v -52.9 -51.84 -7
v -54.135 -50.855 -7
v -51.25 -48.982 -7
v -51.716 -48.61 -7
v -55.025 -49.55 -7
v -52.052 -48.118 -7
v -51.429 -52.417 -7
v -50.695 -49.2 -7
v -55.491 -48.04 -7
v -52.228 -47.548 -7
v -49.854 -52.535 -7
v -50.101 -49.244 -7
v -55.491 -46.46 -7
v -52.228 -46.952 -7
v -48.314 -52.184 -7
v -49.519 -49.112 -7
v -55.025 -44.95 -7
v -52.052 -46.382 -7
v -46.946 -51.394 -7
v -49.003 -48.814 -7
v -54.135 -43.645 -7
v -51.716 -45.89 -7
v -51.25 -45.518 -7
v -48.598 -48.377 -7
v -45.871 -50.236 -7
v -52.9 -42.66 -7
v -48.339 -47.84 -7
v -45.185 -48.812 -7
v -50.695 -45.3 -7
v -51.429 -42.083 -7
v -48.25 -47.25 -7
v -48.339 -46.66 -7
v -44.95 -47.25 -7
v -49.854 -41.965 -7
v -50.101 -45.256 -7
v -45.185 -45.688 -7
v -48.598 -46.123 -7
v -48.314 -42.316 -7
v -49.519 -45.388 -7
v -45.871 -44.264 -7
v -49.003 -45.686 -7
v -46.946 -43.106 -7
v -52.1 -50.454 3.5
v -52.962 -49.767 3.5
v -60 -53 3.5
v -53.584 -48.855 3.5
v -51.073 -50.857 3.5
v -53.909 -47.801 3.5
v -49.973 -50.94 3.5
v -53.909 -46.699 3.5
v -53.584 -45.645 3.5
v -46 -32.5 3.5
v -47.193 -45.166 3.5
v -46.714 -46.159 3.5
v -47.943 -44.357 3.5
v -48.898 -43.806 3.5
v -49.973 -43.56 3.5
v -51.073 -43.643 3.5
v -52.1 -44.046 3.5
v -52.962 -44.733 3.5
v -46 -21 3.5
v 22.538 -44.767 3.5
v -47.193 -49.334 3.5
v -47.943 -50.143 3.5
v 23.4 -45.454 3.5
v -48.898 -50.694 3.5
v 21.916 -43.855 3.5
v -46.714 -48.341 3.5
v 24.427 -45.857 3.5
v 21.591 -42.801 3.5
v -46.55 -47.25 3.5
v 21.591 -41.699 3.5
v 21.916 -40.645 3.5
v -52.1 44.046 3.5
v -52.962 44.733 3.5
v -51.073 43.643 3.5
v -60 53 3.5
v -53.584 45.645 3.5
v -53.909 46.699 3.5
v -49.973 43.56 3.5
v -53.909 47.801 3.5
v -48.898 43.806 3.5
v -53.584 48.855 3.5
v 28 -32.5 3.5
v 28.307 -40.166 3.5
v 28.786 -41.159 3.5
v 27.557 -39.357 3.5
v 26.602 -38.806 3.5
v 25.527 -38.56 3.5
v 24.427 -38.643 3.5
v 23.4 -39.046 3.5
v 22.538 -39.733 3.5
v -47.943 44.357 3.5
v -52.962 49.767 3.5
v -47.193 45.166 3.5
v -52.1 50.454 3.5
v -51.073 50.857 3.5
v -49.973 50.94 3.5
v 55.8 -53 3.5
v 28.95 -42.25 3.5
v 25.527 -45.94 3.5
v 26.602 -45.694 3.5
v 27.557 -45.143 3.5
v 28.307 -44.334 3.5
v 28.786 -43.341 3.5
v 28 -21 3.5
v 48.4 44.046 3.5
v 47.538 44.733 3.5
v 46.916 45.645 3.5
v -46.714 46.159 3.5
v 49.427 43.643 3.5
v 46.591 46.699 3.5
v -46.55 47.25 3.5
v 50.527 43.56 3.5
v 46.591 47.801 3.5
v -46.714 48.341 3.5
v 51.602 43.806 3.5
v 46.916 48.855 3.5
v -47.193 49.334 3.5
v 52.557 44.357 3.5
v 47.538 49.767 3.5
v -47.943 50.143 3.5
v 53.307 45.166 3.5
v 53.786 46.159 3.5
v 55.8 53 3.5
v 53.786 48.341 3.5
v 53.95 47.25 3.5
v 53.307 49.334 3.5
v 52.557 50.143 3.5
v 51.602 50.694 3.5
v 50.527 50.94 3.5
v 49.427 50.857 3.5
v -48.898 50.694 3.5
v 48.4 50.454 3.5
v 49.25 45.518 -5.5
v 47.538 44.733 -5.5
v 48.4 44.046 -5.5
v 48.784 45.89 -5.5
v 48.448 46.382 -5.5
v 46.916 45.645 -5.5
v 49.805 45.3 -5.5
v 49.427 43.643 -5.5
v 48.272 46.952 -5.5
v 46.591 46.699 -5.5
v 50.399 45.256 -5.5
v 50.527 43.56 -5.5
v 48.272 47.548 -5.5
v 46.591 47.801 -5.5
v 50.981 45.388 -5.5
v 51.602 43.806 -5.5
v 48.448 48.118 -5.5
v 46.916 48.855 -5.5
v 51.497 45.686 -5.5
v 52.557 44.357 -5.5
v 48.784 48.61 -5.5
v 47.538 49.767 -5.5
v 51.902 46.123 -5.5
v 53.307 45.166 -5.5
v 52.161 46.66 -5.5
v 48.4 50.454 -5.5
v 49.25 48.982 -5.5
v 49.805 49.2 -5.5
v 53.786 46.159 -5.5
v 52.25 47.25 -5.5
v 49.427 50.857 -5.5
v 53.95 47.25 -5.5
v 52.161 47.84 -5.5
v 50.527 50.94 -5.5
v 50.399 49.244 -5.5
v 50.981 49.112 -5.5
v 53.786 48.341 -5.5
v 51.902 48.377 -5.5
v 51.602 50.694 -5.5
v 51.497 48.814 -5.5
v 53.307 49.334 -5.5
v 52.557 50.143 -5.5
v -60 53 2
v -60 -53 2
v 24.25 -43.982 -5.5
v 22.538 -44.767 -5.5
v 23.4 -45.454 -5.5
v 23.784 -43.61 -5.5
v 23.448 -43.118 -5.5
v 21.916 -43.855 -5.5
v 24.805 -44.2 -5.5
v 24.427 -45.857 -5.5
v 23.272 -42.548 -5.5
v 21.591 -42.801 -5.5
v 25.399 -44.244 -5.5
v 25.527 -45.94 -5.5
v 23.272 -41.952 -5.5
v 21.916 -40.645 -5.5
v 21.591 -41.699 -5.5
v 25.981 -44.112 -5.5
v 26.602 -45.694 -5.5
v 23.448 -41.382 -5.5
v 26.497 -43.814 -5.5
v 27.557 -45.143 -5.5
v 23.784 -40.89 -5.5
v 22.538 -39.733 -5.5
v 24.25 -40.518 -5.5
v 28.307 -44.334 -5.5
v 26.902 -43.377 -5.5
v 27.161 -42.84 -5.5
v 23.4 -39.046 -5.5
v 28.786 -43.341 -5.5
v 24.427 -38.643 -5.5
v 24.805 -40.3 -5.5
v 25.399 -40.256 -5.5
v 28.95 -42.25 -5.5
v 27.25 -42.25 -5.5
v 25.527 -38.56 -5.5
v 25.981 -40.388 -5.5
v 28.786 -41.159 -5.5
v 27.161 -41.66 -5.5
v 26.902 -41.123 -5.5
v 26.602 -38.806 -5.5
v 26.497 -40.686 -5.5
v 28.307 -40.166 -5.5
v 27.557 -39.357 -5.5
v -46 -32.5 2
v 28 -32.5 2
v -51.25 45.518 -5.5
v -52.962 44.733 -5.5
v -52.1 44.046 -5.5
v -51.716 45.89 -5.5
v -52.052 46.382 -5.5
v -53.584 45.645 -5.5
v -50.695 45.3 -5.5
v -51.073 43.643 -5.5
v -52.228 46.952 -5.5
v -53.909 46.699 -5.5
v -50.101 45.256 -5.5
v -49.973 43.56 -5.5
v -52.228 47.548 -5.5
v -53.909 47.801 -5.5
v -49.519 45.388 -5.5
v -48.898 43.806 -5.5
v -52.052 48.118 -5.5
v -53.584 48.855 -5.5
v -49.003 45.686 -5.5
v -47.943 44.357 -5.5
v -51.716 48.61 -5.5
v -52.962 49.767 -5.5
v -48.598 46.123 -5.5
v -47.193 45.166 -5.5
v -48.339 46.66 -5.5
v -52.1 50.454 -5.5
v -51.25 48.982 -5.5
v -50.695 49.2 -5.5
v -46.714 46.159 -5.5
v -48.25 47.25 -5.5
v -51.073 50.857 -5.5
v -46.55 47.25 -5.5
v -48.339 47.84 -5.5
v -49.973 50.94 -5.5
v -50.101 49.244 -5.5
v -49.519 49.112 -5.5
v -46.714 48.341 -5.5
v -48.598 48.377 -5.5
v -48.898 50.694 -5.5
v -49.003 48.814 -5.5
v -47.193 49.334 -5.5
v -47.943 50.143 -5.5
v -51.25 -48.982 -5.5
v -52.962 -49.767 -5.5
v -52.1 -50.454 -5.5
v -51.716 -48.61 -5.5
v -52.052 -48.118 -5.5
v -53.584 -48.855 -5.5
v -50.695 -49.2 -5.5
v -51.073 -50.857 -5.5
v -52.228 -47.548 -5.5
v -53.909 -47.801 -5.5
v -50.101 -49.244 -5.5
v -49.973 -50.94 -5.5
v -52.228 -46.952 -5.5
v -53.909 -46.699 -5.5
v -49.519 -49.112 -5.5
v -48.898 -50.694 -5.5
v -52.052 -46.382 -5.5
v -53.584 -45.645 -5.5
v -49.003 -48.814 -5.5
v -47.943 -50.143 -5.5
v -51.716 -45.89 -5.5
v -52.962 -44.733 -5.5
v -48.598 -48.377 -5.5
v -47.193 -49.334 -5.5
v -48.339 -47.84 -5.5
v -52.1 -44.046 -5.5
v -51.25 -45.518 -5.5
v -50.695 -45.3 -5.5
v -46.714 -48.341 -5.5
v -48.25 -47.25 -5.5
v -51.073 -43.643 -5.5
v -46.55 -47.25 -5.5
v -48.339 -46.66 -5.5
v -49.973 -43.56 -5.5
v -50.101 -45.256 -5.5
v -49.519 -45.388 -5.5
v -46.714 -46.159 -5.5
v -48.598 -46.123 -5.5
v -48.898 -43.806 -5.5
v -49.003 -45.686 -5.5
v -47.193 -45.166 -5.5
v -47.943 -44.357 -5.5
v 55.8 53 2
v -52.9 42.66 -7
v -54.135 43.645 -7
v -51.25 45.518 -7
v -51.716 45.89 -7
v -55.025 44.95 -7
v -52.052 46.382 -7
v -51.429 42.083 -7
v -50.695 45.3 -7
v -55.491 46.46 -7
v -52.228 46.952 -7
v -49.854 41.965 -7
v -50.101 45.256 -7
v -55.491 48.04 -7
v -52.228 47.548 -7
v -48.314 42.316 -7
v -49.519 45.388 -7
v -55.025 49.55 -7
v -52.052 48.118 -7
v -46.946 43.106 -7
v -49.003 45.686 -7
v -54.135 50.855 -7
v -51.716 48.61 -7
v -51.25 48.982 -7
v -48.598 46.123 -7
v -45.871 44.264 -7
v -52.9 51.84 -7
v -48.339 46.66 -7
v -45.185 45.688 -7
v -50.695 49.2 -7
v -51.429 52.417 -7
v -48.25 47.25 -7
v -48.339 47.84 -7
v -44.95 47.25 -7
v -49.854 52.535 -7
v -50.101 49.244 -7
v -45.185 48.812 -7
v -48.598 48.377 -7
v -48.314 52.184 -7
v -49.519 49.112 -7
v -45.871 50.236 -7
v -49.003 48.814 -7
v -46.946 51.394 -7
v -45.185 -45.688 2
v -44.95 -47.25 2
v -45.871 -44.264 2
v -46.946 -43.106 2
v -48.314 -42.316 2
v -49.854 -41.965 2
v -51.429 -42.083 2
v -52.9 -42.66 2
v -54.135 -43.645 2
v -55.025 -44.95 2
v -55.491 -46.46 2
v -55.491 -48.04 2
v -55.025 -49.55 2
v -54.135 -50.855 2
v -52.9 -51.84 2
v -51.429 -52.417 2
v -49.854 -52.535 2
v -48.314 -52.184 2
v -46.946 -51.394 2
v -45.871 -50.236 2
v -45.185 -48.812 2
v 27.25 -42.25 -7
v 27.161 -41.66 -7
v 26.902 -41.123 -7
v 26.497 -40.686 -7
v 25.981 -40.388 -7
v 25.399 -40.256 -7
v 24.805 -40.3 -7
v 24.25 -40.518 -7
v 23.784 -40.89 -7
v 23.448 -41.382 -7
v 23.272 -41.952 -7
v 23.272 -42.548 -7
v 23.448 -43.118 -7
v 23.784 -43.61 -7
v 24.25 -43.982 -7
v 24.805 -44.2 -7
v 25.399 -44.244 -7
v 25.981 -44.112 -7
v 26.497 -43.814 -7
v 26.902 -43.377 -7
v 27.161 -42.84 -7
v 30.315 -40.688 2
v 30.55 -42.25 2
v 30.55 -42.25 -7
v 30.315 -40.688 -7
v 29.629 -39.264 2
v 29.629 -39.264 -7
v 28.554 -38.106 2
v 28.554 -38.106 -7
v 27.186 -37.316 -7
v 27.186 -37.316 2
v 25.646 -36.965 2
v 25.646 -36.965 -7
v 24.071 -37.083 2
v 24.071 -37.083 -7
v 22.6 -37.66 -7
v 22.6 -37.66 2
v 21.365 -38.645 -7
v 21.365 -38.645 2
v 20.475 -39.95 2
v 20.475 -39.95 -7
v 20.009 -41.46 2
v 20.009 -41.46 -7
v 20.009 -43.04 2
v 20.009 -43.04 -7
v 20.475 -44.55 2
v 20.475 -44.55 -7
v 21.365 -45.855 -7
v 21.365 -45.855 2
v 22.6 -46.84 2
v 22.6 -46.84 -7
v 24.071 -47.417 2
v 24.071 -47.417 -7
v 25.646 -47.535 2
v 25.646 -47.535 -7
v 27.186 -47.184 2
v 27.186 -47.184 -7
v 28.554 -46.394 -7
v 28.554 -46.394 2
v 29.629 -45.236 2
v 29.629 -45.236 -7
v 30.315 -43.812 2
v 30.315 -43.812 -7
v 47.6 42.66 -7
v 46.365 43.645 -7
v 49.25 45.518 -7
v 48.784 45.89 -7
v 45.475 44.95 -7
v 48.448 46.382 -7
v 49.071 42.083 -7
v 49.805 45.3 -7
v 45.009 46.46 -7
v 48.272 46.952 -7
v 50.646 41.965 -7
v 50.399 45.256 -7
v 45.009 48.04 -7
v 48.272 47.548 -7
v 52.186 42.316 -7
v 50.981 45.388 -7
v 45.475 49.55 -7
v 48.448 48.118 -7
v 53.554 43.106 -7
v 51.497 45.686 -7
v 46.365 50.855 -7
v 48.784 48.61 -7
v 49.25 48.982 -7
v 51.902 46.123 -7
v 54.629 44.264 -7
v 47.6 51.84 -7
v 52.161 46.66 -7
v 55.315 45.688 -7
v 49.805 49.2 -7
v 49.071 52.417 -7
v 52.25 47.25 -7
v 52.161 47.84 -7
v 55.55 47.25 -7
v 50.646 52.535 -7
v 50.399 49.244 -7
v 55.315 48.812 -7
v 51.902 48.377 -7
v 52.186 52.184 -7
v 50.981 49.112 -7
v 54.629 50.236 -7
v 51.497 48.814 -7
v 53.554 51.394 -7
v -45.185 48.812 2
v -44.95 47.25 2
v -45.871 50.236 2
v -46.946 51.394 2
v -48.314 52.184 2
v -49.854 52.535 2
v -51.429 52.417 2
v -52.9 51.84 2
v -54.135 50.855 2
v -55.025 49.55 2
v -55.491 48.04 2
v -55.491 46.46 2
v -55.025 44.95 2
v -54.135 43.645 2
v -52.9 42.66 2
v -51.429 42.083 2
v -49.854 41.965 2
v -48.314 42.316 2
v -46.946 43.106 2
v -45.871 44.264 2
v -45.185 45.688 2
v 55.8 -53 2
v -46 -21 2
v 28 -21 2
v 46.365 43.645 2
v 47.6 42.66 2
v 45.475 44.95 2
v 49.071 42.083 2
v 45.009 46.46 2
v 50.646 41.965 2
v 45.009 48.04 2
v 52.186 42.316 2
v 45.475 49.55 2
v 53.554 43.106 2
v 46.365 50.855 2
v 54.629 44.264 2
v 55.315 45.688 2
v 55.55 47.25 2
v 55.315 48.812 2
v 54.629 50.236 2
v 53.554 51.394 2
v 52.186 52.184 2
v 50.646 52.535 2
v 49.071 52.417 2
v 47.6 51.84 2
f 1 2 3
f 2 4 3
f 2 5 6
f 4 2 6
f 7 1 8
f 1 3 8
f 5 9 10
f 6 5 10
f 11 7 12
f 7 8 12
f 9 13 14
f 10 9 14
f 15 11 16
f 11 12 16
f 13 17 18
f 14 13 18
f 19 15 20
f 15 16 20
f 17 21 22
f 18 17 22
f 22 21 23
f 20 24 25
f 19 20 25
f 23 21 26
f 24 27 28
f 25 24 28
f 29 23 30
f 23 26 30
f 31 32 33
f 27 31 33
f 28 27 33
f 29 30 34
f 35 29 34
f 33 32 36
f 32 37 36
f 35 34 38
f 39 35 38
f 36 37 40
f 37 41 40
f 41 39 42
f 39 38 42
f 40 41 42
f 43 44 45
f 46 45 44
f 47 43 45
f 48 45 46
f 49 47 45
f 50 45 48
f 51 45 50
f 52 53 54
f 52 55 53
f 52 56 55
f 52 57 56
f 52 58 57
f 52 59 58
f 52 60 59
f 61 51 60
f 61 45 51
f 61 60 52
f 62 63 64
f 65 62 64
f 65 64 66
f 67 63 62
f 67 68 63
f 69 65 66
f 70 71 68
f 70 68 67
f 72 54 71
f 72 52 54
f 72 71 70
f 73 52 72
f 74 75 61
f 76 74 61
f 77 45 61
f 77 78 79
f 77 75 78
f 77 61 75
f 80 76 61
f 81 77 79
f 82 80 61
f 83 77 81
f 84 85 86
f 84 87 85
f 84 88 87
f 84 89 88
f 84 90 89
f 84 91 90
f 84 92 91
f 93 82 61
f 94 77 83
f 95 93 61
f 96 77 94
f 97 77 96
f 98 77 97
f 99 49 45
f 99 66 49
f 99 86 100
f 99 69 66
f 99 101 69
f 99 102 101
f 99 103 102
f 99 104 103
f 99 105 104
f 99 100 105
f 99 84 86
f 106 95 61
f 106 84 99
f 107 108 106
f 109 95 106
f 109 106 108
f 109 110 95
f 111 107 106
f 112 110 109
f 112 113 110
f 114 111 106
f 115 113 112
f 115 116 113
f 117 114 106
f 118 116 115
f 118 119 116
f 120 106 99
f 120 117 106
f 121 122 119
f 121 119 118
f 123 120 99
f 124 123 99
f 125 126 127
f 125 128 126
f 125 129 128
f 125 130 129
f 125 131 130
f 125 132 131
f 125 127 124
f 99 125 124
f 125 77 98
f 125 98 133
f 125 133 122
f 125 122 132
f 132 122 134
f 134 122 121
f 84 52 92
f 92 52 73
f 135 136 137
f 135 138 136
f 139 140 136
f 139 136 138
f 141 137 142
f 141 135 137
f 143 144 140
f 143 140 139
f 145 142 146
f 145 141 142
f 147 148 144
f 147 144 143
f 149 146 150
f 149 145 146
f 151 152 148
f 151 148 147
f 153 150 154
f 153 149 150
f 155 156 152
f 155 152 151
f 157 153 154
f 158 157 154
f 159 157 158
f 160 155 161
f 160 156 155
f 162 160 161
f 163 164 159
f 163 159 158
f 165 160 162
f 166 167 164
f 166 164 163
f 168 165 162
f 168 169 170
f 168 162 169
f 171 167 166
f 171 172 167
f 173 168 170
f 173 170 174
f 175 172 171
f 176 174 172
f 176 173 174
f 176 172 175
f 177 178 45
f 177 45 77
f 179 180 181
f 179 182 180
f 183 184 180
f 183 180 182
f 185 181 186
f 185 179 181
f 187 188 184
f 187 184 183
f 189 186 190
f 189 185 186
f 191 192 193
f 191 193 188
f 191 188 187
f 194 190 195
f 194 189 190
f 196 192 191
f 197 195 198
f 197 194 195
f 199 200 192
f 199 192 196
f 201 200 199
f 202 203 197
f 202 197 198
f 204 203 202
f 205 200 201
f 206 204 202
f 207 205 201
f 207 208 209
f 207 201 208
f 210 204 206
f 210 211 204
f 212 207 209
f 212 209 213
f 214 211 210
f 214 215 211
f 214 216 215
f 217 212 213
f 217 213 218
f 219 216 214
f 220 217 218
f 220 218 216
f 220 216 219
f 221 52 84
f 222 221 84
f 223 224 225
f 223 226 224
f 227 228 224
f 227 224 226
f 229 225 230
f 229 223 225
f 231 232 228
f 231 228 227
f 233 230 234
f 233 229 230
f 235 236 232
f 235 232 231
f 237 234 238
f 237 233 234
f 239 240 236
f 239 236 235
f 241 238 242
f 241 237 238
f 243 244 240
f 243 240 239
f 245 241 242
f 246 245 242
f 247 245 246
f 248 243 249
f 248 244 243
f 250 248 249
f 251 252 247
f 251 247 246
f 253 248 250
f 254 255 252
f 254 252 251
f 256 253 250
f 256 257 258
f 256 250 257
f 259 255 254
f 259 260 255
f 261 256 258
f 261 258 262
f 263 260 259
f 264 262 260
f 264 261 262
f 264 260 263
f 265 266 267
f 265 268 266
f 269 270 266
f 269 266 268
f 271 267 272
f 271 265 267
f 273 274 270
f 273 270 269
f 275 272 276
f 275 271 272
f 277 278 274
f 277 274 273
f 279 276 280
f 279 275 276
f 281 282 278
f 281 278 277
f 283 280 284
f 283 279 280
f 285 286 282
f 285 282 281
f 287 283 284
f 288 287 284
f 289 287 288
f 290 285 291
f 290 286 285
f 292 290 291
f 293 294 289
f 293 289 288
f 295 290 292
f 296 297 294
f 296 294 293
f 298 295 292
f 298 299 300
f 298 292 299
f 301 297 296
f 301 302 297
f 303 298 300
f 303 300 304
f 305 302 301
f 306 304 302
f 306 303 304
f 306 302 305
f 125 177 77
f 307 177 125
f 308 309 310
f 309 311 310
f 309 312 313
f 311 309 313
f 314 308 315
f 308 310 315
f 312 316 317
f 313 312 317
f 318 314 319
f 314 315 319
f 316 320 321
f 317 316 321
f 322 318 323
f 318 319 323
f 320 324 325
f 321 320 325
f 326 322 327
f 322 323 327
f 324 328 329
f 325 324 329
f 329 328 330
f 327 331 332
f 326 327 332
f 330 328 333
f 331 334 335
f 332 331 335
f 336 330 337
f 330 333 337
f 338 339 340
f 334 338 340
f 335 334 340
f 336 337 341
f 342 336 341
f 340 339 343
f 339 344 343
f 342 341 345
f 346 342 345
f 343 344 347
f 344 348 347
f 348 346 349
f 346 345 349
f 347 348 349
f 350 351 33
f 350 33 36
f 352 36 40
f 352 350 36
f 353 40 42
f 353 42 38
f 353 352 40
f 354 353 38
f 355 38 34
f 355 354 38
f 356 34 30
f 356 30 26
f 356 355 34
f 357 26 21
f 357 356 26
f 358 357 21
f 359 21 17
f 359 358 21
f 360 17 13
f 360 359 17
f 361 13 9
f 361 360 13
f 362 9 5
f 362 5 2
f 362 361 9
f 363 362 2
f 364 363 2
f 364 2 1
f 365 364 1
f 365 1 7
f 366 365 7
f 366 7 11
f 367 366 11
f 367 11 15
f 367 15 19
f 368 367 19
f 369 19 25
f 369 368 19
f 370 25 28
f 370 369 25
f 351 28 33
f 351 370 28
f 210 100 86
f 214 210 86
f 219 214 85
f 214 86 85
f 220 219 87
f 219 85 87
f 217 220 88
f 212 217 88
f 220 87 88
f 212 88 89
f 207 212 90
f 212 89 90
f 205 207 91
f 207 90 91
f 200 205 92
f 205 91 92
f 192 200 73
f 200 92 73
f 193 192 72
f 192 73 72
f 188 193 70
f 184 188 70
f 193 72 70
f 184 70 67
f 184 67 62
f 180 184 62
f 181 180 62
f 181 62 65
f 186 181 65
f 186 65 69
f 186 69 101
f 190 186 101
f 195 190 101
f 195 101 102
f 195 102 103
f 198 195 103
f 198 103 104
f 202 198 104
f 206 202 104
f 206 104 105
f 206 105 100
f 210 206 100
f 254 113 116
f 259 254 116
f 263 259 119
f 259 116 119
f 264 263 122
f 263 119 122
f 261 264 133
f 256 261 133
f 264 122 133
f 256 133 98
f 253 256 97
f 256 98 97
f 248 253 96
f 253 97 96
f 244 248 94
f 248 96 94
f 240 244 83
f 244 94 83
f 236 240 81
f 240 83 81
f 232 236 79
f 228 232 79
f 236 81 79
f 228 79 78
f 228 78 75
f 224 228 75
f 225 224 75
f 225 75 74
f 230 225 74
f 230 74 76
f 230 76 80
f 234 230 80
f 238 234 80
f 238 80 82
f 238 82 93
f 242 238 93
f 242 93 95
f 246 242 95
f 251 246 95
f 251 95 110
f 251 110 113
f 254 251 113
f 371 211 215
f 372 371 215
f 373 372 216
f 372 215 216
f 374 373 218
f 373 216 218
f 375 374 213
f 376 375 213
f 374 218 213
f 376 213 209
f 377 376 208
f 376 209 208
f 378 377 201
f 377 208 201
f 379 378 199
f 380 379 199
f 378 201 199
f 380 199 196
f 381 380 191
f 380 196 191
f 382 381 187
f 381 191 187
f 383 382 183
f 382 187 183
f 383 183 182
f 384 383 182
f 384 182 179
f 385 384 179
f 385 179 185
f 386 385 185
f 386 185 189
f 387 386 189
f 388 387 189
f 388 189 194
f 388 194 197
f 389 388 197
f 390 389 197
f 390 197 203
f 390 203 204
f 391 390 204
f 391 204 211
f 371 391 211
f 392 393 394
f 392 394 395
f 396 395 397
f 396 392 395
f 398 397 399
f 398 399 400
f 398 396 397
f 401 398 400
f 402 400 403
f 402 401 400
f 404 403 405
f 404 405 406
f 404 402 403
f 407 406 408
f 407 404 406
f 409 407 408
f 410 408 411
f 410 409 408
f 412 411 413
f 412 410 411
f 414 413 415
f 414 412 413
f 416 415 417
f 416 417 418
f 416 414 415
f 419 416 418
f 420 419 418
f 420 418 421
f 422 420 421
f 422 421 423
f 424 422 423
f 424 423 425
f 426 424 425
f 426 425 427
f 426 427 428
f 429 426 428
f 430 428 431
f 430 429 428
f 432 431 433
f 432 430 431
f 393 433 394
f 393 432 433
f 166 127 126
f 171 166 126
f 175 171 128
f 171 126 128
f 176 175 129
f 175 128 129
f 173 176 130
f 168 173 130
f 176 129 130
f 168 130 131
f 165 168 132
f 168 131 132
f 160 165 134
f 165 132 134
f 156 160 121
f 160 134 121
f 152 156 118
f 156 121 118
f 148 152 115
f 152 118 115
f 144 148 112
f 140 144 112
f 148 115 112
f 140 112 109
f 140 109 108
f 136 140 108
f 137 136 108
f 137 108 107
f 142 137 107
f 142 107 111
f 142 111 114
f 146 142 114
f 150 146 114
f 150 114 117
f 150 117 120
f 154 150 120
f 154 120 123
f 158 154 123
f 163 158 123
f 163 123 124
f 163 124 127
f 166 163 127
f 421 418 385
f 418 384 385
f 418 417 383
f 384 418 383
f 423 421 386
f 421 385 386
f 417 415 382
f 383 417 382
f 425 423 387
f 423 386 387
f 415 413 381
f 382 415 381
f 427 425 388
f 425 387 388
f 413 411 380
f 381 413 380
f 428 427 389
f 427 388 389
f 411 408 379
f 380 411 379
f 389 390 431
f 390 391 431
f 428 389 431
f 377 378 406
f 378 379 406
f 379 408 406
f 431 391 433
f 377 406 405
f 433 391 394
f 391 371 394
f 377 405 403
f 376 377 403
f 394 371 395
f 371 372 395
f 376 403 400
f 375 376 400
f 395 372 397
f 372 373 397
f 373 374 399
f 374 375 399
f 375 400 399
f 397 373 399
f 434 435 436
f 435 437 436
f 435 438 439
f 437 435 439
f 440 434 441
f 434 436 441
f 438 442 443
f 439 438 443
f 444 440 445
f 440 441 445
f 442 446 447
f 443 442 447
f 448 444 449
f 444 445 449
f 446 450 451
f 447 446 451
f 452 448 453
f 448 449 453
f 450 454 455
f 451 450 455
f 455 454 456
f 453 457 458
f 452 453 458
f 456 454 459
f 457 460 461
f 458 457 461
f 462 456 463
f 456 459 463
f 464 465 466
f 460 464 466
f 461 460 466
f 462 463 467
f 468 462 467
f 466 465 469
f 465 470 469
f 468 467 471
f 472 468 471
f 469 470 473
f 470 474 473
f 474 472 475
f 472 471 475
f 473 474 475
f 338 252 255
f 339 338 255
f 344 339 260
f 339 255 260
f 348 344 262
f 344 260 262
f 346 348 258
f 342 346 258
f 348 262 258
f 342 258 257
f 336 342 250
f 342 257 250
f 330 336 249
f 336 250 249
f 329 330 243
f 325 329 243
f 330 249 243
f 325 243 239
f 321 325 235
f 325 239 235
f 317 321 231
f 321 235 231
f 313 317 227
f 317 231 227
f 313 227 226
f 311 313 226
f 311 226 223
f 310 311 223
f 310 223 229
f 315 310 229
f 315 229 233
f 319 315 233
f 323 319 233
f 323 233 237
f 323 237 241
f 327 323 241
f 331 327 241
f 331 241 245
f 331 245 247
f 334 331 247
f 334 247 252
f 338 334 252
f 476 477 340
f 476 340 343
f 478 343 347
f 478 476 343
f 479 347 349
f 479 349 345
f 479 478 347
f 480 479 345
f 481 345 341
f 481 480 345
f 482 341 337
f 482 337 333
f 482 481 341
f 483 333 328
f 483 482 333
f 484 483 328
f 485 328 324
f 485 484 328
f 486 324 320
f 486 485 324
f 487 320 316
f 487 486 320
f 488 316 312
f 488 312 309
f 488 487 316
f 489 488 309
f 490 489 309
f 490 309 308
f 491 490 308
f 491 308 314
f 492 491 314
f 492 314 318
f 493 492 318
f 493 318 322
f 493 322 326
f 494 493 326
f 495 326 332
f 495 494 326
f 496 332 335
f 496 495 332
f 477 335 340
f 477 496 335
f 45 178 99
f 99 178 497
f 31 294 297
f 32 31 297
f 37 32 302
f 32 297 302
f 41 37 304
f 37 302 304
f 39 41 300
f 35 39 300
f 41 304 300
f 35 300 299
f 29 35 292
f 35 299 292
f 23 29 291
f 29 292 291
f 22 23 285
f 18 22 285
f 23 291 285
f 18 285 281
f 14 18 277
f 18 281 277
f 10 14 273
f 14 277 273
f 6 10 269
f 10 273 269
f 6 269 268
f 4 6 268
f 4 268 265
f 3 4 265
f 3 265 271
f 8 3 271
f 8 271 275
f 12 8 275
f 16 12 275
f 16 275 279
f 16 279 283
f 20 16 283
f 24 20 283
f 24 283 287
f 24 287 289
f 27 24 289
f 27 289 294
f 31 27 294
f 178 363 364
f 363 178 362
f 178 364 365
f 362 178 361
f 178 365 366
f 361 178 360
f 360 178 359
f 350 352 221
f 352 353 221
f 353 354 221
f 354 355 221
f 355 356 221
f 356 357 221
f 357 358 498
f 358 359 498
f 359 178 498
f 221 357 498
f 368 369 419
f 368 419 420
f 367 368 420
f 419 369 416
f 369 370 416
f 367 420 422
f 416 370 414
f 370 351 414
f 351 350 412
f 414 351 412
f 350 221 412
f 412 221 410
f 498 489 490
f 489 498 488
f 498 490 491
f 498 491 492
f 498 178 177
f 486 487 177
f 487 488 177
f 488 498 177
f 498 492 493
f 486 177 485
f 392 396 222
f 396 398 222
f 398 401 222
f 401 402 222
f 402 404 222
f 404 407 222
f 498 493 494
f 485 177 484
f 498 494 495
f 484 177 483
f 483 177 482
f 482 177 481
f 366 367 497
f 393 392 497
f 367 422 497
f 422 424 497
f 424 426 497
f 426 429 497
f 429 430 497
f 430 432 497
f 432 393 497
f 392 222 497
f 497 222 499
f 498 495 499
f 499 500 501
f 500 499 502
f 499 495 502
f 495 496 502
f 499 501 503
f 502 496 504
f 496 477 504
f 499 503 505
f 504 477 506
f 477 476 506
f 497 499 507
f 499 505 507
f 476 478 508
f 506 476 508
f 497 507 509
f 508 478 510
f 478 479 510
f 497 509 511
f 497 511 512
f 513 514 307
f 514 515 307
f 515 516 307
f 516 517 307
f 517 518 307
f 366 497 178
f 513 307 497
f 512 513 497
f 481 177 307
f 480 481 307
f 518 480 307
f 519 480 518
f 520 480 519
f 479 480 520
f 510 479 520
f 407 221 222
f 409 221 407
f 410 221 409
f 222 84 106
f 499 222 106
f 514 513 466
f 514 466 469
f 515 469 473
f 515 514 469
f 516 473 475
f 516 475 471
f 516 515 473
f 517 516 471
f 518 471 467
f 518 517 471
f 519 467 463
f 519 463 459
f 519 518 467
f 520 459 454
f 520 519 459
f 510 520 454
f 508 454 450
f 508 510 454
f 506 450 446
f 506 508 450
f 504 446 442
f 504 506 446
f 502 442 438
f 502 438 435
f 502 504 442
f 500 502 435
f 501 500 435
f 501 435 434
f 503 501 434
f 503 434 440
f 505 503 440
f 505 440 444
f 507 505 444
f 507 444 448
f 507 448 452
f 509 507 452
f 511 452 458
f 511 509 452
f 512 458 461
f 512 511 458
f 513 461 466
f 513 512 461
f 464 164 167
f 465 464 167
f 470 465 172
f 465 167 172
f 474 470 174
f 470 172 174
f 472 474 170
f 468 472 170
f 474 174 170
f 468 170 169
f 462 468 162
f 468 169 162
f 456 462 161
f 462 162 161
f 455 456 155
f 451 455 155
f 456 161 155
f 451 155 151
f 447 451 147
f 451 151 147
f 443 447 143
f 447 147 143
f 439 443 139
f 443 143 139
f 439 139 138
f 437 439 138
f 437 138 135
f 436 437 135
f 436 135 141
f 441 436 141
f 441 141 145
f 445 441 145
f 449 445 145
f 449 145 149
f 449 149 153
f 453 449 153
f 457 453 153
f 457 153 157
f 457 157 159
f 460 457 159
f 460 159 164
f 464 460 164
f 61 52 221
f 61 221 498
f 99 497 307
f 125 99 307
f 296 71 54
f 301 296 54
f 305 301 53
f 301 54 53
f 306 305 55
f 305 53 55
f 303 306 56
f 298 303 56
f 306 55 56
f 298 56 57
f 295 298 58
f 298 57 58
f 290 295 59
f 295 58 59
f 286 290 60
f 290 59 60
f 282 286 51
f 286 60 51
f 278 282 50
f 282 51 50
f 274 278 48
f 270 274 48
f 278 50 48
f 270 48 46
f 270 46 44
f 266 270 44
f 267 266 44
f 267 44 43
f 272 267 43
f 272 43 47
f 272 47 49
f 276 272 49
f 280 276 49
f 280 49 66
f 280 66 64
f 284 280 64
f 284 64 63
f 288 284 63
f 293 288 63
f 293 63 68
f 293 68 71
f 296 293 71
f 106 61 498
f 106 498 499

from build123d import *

# Parameters (mm, degrees)
SKETCH_W         = 74
SKETCH_H         = 11.5
EXTRUDE002_DEPTH = 10
SKETCH007_R      = 3.7
EXTRUDE001_DEPTH = 11.5
SKETCH006_R      = 5.3
SKETCH006_R_2    = 2
EXTRUDE_DEPTH    = 9
BOX001_W         = 115.8
BOX001_H         = 106
BOX001_DEPTH     = 1.5


with BuildPart() as extrude002:
    # Sketch → Extrude002 (new body)
    with BuildSketch(Plane.XY.offset(3.5)):
        with Locations((-9, -26.75)):
            Rectangle(SKETCH_W, SKETCH_H)
    extrude(amount=-EXTRUDE002_DEPTH)


with BuildPart() as extrude001:
    # Sketch007 → Extrude001 (new body)
    with BuildSketch(Plane.XY.offset(2)):
        with Locations((-50.25, -47.25)):
            Circle(SKETCH007_R)
        with Locations((50.25, 47.25)):
            Circle(SKETCH007_R)
        with Locations((-50.25, 47.25)):
            Circle(SKETCH007_R)
        with Locations((25.25, -42.25)):
            Circle(SKETCH007_R)
    extrude(amount=-EXTRUDE001_DEPTH)


with BuildPart() as extrude001_1:
    # Extrude001 placement: moved
    add(extrude001.part.moved(Location((0, 0, 4))))


with BuildPart() as extrude_mount_columns:
    # Sketch006 → Extrude (new body)
    with BuildSketch(Plane.XY.offset(2)):
        with Locations((-50.25, -47.25)):
            Circle(SKETCH006_R)
        with Locations((-50.25, -47.25)):
            Circle(SKETCH006_R_2, mode=Mode.SUBTRACT)
        with Locations((50.25, 47.25)):
            Circle(SKETCH006_R)
        with Locations((50.25, 47.25)):
            Circle(SKETCH006_R_2, mode=Mode.SUBTRACT)
        with Locations((-50.25, 47.25)):
            Circle(SKETCH006_R)
        with Locations((-50.25, 47.25)):
            Circle(SKETCH006_R_2, mode=Mode.SUBTRACT)
        with Locations((25.25, -42.25)):
            Circle(SKETCH006_R)
        with Locations((25.25, -42.25)):
            Circle(SKETCH006_R_2, mode=Mode.SUBTRACT)
    extrude(amount=-EXTRUDE_DEPTH)


with BuildPart() as cut001:
    # Box001 → Box001 (new body)
    with BuildSketch(Plane(origin=(-60, -53, 2), x_dir=(1, 0, 0), z_dir=(0, 0, 1))):
        with Locations((57.9, 53)):
            Rectangle(BOX001_W, BOX001_H)
    extrude(amount=BOX001_DEPTH)

    # Fusion: union Extrude Mount Columns
    add(extrude_mount_columns.part)

    # Cut: cut Extrude001
    add(extrude001_1.part, mode=Mode.SUBTRACT)

    # Cut001: cut Extrude002
    add(extrude002.part, mode=Mode.SUBTRACT)


solid = cut001.part
